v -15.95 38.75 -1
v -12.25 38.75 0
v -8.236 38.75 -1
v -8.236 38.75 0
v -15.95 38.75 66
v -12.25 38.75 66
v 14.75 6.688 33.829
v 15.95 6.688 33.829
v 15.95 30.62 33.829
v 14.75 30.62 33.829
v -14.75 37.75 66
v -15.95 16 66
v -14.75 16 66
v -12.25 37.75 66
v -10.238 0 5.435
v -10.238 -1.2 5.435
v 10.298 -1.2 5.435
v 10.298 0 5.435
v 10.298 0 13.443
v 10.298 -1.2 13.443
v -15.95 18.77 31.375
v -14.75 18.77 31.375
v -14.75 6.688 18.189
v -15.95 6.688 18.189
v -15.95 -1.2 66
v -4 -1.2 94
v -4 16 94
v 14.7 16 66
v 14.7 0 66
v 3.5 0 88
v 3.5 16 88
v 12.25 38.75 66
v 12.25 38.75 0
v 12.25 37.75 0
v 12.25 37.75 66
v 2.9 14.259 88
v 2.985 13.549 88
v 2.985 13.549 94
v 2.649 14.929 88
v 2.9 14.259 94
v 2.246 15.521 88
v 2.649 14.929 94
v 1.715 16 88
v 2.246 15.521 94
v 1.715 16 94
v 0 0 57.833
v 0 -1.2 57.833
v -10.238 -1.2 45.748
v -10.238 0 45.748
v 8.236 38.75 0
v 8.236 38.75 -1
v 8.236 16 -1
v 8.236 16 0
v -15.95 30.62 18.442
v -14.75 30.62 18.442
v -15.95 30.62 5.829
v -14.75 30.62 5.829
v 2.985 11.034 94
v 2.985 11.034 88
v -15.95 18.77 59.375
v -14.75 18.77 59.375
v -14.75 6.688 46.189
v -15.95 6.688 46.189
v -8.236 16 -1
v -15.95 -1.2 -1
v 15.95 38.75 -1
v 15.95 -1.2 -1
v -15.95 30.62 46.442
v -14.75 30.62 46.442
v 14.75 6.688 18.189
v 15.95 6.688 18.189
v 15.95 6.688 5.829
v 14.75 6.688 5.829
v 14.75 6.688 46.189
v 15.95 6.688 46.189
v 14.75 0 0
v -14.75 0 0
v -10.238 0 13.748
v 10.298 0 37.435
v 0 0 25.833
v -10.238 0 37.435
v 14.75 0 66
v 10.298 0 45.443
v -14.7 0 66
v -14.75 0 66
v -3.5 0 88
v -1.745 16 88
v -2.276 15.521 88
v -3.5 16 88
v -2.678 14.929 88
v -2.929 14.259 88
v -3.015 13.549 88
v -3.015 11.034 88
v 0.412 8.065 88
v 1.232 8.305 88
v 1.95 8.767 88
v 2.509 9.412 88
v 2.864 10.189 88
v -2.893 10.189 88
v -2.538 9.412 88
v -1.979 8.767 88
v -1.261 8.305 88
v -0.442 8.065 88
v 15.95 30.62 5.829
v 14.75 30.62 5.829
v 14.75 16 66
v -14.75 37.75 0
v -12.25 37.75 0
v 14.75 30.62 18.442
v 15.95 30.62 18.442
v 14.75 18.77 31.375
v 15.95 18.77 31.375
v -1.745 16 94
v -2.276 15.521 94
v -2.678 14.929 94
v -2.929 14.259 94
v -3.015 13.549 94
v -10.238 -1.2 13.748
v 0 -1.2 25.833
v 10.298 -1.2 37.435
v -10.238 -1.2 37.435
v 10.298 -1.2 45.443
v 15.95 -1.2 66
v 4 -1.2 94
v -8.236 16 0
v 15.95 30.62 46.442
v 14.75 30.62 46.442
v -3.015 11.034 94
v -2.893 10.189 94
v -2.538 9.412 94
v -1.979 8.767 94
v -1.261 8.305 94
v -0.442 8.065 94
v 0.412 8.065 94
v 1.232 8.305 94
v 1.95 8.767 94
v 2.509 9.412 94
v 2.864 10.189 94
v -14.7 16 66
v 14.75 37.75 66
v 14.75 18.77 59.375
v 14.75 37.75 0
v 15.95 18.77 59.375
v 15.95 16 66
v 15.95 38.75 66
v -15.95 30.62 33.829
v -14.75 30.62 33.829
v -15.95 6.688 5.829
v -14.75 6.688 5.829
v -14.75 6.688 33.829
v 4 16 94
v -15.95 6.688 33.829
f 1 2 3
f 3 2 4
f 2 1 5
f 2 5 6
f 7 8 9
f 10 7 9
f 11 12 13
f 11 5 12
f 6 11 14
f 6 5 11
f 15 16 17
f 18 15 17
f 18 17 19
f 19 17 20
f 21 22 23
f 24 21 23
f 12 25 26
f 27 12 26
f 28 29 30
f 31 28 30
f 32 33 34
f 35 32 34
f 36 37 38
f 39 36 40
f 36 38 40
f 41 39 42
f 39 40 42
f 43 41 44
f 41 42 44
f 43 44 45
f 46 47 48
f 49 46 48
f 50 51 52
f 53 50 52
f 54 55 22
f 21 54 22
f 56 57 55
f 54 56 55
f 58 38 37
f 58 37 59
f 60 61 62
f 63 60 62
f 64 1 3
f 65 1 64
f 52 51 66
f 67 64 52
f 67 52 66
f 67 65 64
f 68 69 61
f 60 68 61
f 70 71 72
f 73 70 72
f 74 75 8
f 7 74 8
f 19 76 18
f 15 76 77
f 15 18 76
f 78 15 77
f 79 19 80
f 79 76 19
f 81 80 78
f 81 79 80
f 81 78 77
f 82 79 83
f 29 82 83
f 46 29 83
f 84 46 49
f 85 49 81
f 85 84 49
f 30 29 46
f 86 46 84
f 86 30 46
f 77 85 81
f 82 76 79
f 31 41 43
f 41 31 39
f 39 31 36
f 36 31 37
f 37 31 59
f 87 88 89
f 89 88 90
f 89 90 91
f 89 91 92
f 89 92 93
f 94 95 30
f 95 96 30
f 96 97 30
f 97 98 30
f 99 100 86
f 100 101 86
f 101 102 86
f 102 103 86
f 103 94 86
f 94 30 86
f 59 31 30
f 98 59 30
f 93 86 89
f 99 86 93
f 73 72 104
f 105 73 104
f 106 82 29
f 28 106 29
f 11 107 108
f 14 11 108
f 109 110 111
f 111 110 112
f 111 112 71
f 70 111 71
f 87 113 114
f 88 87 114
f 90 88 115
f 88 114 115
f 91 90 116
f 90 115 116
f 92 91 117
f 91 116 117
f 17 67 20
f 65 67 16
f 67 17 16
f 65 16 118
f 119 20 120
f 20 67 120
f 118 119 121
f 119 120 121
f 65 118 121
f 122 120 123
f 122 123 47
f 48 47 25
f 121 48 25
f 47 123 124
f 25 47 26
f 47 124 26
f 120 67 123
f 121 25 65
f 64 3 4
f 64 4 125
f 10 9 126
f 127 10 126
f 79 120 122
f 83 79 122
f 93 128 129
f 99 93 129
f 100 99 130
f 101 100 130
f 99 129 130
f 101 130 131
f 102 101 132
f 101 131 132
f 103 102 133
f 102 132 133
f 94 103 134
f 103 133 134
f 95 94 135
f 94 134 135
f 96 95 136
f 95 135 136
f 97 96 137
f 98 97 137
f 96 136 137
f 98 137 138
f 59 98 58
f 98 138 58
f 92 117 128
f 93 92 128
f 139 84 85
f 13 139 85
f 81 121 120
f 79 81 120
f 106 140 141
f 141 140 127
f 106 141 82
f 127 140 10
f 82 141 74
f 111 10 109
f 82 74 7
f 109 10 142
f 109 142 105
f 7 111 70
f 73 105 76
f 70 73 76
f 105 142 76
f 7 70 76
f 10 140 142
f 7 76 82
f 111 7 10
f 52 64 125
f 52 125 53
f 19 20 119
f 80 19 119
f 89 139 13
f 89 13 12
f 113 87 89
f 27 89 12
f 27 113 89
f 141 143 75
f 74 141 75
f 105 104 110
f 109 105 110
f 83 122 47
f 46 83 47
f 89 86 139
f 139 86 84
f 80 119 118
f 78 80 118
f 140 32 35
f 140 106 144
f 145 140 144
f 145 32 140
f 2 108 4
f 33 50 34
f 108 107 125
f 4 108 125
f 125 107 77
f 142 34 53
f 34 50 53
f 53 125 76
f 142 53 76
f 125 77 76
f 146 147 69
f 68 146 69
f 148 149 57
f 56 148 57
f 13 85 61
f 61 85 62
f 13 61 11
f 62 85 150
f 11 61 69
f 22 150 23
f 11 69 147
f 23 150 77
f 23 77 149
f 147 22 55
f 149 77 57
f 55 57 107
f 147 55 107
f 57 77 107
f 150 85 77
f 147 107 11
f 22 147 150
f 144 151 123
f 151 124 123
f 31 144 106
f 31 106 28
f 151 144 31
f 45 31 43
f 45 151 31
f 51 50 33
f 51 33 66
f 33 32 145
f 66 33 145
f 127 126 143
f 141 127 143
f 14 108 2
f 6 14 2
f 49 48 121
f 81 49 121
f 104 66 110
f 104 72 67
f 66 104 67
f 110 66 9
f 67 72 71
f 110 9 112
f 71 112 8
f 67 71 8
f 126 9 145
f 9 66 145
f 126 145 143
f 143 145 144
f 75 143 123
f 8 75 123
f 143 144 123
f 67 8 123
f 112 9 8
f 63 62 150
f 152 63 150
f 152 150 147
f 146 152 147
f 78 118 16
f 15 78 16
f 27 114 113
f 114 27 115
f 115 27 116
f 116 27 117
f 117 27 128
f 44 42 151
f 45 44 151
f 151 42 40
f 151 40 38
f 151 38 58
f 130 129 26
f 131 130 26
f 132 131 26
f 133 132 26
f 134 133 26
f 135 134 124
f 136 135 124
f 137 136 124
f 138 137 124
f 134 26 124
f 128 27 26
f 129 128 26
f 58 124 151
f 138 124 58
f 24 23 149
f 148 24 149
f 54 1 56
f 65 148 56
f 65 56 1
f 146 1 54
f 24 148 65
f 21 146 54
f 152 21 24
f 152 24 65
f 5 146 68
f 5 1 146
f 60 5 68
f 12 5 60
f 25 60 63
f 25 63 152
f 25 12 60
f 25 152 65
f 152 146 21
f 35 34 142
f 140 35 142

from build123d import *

# Parameters (mm, degrees)
PAD_DEPTH              = 66
SKETCH001_W            = 31.9
SKETCH001_H            = 39.95
PAD001_DEPTH           = 1
PAD002_DEPTH           = 1.2
PAD003_DEPTH           = 16
SKETCH011_W            = 16.471436
SKETCH011_H            = 30.415474
POCKET_DEPTH           = 5
POCKET001_DEPTH        = 8
POCKET002_DEPTH        = 5
LINEARPATTERN_COUNT    = 2
LINEARPATTERN_PITCH    = 32
POCKET003_DEPTH        = 31.901
LINEARPATTERN001_COUNT = 2
LINEARPATTERN001_PITCH = 28


with BuildPart() as part:
    # Sketch → Pad (new body)
    with BuildSketch(Plane.XY):
        Polygon((14.75, 37.75), (14.75, 0), (-14.75, 0), (-14.75, 37.75), (-12.25, 37.75), (-12.25, 38.75), (-15.95, 38.75), (-15.95, -1.2), (15.95, -1.2), (15.95, 38.75), (12.25, 38.75), (12.25, 37.75), align=None)
    extrude(amount=PAD_DEPTH)

    # Sketch001 (on Face13 of Pad) → Pad001 (join)
    with BuildSketch(Plane(origin=(0, 0, 0), x_dir=(1, 0, 0), z_dir=(0, 0, -1))):
        with Locations((0, -18.775)):
            Rectangle(SKETCH001_W, SKETCH001_H)
    extrude(amount=PAD001_DEPTH)

    # Sketch002 (on Face13 of Pad001) → Pad002 (join)
    with BuildSketch(Plane.XZ.offset(1.2)):
        Polygon((-15.95, 66), (-4, 94), (4, 94), (15.95, 66), align=None)
    extrude(amount=-PAD002_DEPTH)

    # Sketch007 (on Face8 of Pad002) → Pad003 (join)
    with BuildSketch(Plane(origin=(0, 0, 0), x_dir=(-1, 0, 0), z_dir=(0, 1, 0))):
        Polygon((-15.95, 66), (-14.7, 66), (-3.5, 88), (3.5, 88), (14.7, 66), (15.95, 66), (4, 94), (-4, 94), align=None)
    extrude(amount=PAD003_DEPTH)

    # Sketch011 (on Face24 of Pad003) → Pocket (cut)
    with BuildSketch(Plane(origin=(0, 0, -1), x_dir=(1, 0, 0), z_dir=(0, 0, -1))):
        with Locations((0, -31.207737)):
            Rectangle(SKETCH011_W, SKETCH011_H)
    extrude(amount=-POCKET_DEPTH, mode=Mode.SUBTRACT)

    # Sketch012 (on Face33 of Pocket) → Pocket001 (cut)
    with BuildSketch(Plane.XY.offset(94)):
        with BuildLine():
            ThreePointArc((2.985382, 13.549034), (-0.014618, 16.549034), (-3.014618, 13.549034))
            Line((-3.014618, 13.549034), (-3.014618, 11.03404))
            ThreePointArc((-3.014618, 11.03404), (-0.014618, 8.03404), (2.985382, 11.03404))
            Line((2.985382, 13.549034), (2.985382, 11.03404))
        make_face()
    extrude(amount=-POCKET001_DEPTH, mode=Mode.SUBTRACT)

    # Sketch014 (on Face30 of Pocket001) → Pocket002 (cut)
    with BuildSketch(Plane.XZ.offset(1.2)):
        Polygon((0, 25.833173), (-10.237929, 13.747521), (-10.237929, 5.434677), (10.297925, 5.434677), (10.297925, 13.443167), align=None)
    pocket002 = extrude(amount=-POCKET002_DEPTH, mode=Mode.SUBTRACT)

    # LinearPattern: Pocket002 ×2
    with Locations(*[(0, 0, i * LINEARPATTERN_PITCH) for i in range(1, LINEARPATTERN_COUNT)]):
        add(pocket002, mode=Mode.SUBTRACT)

    # Sketch015 (on Face29 of LinearPattern) → Pocket003 (cut, through all)
    with BuildSketch(Plane.YZ.offset(15.95)):
        Polygon((18.770079, 31.374571), (6.687755, 18.189028), (6.687755, 5.829207), (30.620473, 5.829207), (30.620473, 18.442136), align=None)
    pocket003 = extrude(amount=-POCKET003_DEPTH, mode=Mode.SUBTRACT)

    # LinearPattern001: Pocket003 ×2
    with Locations(*[(0, 0, i * LINEARPATTERN001_PITCH) for i in range(1, LINEARPATTERN001_COUNT)]):
        add(pocket003, mode=Mode.SUBTRACT)


solid = part.part
